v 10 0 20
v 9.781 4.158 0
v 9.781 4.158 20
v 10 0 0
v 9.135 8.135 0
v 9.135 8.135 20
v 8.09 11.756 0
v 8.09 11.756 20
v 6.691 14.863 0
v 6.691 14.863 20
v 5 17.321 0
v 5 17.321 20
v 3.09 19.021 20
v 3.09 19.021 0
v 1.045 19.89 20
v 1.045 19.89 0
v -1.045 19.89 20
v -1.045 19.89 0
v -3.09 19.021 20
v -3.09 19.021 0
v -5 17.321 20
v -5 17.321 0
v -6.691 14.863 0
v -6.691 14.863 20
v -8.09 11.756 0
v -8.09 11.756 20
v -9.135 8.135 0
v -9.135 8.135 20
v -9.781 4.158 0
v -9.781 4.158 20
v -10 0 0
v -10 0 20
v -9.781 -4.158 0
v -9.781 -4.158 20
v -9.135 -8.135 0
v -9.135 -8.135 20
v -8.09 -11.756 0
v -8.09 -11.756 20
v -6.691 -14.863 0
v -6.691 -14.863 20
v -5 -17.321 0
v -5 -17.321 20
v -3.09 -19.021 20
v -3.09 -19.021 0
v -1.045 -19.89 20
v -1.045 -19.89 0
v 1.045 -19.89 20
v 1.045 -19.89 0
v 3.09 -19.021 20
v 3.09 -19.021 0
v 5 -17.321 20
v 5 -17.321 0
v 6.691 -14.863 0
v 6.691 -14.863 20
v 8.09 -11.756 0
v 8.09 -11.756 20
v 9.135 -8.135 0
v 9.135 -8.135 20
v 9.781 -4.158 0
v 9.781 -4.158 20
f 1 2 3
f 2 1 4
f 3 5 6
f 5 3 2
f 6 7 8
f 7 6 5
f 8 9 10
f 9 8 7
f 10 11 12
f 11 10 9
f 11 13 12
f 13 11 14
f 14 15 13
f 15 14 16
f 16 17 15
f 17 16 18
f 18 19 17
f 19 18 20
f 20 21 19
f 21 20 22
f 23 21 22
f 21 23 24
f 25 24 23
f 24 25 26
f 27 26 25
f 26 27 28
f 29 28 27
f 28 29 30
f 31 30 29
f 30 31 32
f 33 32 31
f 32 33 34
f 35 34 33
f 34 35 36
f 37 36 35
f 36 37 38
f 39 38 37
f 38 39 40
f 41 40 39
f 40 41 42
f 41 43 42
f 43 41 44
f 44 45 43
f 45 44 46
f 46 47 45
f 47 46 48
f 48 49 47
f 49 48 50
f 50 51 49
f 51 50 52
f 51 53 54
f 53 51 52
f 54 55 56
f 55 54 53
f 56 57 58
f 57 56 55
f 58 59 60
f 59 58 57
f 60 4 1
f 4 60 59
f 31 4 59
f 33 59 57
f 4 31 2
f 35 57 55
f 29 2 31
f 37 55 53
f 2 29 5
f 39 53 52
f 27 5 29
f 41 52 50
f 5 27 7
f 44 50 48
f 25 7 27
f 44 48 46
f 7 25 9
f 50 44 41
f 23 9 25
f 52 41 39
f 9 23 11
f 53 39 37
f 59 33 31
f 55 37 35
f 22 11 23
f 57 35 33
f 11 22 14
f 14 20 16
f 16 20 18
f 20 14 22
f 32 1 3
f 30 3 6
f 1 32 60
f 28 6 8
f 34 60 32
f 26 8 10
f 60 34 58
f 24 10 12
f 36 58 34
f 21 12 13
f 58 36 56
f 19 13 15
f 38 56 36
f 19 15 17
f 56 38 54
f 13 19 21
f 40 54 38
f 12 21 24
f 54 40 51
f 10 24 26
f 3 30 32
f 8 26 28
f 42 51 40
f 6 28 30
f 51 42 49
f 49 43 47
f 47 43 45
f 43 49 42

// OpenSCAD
// Generated by generate_scads.py
scale([1.0,2.0,2.0]) {
  intersection() {
    cylinder(h=10, r=10, center=false);
  }
}
